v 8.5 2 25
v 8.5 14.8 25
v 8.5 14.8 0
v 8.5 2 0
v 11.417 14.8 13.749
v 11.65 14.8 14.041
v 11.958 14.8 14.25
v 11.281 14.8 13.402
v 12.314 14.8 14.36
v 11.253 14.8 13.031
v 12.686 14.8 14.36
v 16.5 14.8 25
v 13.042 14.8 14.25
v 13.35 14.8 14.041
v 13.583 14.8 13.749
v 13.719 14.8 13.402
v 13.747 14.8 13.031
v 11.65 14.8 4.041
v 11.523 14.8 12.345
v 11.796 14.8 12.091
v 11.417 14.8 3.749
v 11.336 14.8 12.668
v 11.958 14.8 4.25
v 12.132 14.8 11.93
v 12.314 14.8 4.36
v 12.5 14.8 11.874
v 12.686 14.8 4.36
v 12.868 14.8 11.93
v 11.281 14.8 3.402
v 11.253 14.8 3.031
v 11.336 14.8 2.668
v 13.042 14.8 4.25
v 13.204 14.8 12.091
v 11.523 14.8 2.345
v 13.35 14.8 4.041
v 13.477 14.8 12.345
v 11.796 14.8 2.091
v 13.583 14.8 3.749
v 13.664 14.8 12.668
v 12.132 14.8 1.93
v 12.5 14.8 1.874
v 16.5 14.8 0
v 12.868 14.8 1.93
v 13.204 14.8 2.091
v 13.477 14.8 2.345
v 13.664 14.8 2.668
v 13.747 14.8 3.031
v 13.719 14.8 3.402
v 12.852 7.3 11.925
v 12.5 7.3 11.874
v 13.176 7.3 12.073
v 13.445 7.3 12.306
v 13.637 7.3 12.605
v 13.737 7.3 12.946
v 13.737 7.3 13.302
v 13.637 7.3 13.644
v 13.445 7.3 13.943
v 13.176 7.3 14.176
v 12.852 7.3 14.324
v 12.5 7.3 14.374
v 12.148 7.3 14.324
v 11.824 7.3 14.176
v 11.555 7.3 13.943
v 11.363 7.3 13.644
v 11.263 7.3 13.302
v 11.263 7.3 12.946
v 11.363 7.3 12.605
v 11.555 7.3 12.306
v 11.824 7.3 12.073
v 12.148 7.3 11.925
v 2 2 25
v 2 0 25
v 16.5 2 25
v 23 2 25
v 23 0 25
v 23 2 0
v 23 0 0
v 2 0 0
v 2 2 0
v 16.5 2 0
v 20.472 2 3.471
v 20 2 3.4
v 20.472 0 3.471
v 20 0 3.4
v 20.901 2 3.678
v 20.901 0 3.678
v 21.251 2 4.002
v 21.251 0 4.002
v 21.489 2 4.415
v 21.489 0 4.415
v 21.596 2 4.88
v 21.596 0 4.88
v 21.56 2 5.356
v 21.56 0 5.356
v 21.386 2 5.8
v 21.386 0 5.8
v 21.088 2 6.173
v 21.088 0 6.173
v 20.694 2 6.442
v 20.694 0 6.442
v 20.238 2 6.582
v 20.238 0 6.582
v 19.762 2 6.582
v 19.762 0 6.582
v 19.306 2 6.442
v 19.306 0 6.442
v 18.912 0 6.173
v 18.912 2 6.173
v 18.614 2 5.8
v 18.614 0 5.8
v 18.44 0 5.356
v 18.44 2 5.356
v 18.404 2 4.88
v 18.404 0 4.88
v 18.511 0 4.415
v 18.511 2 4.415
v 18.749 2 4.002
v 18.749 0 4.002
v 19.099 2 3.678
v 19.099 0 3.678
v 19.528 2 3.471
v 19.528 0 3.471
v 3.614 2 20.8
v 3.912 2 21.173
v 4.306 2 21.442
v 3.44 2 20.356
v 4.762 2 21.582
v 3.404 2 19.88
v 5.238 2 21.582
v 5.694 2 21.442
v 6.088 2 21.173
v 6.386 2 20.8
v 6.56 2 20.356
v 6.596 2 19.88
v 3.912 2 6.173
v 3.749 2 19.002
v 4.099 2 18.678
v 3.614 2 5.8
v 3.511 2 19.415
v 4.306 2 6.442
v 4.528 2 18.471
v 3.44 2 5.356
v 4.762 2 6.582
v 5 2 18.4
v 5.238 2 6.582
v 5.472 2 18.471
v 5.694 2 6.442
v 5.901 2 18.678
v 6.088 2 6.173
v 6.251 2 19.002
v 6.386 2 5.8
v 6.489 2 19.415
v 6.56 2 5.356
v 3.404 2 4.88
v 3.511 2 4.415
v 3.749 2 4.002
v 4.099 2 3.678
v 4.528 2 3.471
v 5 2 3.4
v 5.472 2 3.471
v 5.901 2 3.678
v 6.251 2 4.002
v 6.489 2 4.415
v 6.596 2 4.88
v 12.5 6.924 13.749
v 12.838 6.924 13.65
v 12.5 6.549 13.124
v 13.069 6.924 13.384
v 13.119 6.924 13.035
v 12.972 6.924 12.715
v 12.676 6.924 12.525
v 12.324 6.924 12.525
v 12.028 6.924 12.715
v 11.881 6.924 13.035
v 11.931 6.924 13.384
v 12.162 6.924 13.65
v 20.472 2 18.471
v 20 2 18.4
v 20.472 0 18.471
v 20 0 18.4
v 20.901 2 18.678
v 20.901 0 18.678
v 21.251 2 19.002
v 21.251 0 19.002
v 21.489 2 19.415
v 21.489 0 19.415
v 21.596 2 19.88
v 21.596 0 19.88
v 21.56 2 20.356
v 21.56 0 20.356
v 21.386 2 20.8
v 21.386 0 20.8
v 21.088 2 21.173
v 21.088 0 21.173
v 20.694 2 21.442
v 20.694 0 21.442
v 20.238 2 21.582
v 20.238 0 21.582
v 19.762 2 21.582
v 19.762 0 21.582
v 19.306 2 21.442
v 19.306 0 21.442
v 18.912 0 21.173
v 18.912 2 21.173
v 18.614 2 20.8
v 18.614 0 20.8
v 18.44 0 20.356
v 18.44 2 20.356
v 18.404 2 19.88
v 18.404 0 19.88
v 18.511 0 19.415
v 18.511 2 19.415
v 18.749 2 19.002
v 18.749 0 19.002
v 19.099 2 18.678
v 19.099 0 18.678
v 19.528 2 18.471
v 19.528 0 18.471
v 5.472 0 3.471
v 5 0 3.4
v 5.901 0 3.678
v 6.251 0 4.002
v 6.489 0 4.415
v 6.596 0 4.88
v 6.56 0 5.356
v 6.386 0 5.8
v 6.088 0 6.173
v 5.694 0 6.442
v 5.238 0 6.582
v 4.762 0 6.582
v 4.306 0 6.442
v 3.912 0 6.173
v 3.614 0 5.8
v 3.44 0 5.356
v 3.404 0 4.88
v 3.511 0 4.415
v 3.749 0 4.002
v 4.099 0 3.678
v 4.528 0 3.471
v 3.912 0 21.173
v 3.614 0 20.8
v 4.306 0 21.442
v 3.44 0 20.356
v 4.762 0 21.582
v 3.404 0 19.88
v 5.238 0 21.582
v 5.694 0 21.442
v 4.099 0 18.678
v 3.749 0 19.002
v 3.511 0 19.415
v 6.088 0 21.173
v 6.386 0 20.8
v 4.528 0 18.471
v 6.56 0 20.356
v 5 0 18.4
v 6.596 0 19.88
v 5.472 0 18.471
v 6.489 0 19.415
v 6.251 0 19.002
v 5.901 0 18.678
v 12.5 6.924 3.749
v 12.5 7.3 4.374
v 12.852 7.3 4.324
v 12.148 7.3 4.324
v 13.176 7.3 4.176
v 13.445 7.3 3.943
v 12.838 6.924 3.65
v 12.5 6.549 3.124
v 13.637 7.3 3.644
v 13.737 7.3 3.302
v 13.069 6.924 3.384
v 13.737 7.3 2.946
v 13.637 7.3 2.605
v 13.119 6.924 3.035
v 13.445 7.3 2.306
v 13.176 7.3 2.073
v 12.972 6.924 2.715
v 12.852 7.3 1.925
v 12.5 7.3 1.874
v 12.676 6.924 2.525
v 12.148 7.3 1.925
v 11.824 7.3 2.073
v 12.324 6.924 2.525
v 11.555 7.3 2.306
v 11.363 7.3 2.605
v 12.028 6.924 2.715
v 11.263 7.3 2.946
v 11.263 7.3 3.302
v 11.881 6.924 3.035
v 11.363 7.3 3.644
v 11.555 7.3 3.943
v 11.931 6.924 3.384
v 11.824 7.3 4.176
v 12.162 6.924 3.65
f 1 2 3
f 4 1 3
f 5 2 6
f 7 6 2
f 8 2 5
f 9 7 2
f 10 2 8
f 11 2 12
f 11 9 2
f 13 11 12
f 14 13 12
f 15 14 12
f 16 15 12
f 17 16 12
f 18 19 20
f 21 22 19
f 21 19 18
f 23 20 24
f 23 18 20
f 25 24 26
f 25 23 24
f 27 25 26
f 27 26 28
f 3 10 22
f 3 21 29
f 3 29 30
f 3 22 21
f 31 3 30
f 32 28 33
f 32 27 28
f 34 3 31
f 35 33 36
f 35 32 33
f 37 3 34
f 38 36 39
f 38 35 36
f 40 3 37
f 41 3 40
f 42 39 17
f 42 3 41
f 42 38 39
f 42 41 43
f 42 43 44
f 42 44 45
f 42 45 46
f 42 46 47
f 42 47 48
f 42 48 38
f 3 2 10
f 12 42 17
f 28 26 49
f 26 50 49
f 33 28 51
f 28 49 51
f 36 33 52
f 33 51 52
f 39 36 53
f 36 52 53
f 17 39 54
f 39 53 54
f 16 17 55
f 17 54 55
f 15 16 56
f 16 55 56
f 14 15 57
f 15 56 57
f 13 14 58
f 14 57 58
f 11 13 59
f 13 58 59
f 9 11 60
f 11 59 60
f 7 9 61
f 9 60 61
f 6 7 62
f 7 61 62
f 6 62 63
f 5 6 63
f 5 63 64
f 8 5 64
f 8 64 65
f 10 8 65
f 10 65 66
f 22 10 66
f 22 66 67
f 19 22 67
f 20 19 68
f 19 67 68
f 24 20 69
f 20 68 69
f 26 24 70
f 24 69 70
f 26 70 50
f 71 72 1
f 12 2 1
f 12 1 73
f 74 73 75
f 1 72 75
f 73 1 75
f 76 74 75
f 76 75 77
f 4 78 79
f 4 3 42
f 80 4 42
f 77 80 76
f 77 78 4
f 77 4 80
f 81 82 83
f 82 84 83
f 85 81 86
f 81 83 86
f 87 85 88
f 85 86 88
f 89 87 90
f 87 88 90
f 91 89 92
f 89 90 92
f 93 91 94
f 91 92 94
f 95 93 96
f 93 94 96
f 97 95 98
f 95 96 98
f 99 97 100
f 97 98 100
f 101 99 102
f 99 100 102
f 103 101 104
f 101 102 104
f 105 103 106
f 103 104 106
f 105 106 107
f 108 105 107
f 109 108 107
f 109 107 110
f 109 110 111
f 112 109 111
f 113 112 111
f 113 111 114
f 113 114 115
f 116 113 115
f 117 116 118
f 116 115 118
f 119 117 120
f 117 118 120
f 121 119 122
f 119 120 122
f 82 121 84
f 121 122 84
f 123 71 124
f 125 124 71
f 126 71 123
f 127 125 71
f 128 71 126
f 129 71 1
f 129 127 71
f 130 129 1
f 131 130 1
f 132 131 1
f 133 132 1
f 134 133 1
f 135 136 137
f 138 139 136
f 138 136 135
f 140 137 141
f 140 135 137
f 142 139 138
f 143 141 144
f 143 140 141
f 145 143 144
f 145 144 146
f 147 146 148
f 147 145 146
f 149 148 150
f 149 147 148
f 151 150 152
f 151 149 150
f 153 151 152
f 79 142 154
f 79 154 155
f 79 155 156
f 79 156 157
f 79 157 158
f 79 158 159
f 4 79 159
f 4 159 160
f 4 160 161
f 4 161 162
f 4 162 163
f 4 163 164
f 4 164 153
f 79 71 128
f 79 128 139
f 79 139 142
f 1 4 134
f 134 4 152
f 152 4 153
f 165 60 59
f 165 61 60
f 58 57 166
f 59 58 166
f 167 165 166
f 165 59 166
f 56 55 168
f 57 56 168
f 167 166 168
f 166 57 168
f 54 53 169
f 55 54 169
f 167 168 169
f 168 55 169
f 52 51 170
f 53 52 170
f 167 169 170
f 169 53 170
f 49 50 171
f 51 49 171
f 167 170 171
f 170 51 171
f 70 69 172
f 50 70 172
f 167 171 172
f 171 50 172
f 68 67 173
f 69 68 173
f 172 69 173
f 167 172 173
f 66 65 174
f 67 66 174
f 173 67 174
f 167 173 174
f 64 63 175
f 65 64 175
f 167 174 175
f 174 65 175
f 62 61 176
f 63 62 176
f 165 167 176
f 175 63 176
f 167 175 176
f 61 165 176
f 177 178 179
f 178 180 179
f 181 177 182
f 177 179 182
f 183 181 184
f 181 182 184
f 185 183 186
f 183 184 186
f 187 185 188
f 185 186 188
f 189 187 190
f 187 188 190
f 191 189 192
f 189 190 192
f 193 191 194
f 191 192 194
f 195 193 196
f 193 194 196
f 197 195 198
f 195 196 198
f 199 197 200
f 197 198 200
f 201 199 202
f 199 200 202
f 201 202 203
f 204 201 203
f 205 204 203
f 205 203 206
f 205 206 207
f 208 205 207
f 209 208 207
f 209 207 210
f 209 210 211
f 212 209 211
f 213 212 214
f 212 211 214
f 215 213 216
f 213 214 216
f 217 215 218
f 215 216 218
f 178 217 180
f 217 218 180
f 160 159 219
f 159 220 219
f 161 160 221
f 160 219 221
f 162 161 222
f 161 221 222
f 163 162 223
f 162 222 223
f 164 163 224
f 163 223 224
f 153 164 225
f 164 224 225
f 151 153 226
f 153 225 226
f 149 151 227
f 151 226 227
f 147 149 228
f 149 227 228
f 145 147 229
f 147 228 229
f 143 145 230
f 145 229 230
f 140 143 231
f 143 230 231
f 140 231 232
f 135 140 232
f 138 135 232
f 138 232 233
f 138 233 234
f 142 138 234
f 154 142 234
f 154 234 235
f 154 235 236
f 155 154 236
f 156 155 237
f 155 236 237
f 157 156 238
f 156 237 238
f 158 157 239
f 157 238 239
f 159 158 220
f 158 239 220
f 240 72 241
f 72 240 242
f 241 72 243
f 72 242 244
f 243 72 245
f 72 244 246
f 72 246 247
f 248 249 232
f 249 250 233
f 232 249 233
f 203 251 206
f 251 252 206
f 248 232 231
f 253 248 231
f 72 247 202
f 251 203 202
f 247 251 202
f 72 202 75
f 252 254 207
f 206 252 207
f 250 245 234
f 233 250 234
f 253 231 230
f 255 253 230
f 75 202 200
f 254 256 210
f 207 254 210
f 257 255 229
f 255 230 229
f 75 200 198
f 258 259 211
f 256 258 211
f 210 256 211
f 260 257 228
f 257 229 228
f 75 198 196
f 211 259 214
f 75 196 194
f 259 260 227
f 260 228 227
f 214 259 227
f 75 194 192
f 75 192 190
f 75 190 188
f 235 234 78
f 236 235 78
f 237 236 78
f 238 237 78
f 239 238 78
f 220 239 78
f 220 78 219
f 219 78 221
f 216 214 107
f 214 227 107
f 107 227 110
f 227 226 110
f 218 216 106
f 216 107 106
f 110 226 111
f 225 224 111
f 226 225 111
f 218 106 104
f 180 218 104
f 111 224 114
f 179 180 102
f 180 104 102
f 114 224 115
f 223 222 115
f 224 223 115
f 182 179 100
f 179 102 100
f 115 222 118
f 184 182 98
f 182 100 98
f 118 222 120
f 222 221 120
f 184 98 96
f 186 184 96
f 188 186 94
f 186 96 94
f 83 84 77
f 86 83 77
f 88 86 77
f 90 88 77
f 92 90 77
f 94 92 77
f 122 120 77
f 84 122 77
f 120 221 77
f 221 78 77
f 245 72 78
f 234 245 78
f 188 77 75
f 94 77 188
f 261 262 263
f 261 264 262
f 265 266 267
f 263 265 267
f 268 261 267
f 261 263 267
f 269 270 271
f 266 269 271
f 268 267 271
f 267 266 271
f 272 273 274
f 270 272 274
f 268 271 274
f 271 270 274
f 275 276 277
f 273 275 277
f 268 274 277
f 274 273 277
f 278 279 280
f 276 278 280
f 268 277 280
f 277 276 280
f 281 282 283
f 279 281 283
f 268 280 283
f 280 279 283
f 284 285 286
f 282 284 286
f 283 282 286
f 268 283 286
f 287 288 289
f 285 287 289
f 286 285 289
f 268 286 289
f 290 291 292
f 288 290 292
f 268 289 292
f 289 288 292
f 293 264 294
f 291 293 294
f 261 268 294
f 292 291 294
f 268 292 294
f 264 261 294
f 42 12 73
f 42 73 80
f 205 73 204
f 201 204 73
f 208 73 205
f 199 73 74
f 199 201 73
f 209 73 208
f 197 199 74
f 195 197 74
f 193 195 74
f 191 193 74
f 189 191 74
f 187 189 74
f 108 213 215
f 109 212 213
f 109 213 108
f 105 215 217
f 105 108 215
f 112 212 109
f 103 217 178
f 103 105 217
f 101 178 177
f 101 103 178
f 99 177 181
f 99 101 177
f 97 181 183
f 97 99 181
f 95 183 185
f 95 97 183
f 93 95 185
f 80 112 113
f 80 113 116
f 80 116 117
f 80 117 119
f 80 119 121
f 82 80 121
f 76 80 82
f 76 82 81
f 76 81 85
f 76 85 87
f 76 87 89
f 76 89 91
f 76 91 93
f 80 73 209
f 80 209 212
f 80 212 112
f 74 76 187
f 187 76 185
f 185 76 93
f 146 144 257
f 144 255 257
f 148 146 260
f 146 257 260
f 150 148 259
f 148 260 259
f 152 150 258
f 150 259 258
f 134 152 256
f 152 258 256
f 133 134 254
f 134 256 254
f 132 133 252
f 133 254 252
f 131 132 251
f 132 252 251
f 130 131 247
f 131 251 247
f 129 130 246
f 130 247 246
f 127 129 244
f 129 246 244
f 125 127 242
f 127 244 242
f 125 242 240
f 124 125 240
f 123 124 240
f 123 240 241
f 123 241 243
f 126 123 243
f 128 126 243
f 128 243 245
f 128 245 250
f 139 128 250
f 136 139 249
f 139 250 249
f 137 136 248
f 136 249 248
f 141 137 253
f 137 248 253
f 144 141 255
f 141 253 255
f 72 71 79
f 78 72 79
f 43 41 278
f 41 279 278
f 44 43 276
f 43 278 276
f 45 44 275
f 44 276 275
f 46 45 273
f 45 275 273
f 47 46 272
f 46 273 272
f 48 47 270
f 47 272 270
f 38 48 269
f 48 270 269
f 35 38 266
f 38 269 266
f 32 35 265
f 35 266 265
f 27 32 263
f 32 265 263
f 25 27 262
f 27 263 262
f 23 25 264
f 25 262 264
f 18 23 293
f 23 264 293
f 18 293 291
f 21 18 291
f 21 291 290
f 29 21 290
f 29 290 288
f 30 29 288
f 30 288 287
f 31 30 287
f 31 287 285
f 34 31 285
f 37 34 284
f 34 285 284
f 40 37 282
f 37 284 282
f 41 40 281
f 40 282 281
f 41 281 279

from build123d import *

# Parameters (mm, degrees)
SKETCH1_W                 = 25
SKETCH1_H                 = 25
BOSS_EXTRUDE1_DEPTH       = 14.8
M3_CLEARANCE_HOLE1_D      = 3.2
M3X0_5_TAPPED_HOLE2_D     = 2.5
M3X0_5_TAPPED_HOLE2_DEPTH = 7.5
M3X0_5_TAPPED_HOLE2_TIP   = 0.751075774
SKETCH8_W                 = 8.5
SKETCH8_H                 = 25
CUT_EXTRUDE1_DEPTH        = 9.77
SKETCH9_W                 = 8.5
SKETCH9_H                 = 25
CUT_EXTRUDE2_DEPTH        = 9.77
SKETCH10_W                = 2
SKETCH10_H                = 25
CUT_EXTRUDE3_DEPTH        = 9.77
SKETCH11_W                = 2
SKETCH11_H                = 25
CUT_EXTRUDE4_DEPTH        = 9.77
SKETCH16_W                = 6.5
SKETCH16_H                = 25
CUT_EXTRUDE6_DEPTH        = 3.03
SKETCH17_W                = 6.5
SKETCH17_H                = 25
CUT_EXTRUDE7_DEPTH        = 3.03


with BuildPart() as part:
    # Sketch1 → Boss-Extrude1 (new body)
    with BuildSketch(Plane(origin=(0, 0, 0), x_dir=(1, 0, 0), z_dir=(0, 1, 0))):
        with Locations((12.5, -12.5)):
            Rectangle(SKETCH1_W, SKETCH1_H)
    extrude(amount=BOSS_EXTRUDE1_DEPTH)

    # M3 Clearance Hole1 (through all)
    with Locations(Plane(origin=(5, 14.8, 5), x_dir=(0, 0, 1), z_dir=(0, 1, 0))):
        with Locations((0, 0), (0, 15), (15, 15), (15, 0)):
            Hole(M3_CLEARANCE_HOLE1_D / 2)

    # M3x0.5 Tapped Hole2
    with Locations(Plane(origin=(12.5, 14.8, 3.124233191), x_dir=(0, 0, 1), z_dir=(0, 1, 0))):
        with Locations((0, 0), (10, 0)):
            Hole(M3X0_5_TAPPED_HOLE2_D / 2, depth=M3X0_5_TAPPED_HOLE2_DEPTH)
            with Locations((0, 0, -(M3X0_5_TAPPED_HOLE2_DEPTH + M3X0_5_TAPPED_HOLE2_TIP / 2))):  # 118° drill point
                Cone(0, M3X0_5_TAPPED_HOLE2_D / 2, M3X0_5_TAPPED_HOLE2_TIP, mode=Mode.SUBTRACT)

    # Sketch8 → Cut-Extrude1 (cut)
    with BuildSketch(Plane(origin=(0, 14.8, 0), x_dir=(1, 0, 0), z_dir=(0, 1, 0))):
        with Locations((4.25, -12.5)):
            Rectangle(SKETCH8_W, SKETCH8_H)
    extrude(amount=-CUT_EXTRUDE1_DEPTH, mode=Mode.SUBTRACT)

    # Sketch9 → Cut-Extrude2 (cut)
    with BuildSketch(Plane(origin=(0, 14.8, 0), x_dir=(1, 0, 0), z_dir=(0, 1, 0))):
        with Locations((20.75, -12.5)):
            Rectangle(SKETCH9_W, SKETCH9_H)
    extrude(amount=-CUT_EXTRUDE2_DEPTH, mode=Mode.SUBTRACT)

    # Sketch10 → Cut-Extrude3 (cut)
    with BuildSketch(Plane(origin=(0, 5.03, 0), x_dir=(1, 0, 0), z_dir=(0, 1, 0))):
        with Locations((1, -12.5)):
            Rectangle(SKETCH10_W, SKETCH10_H)
    extrude(amount=-CUT_EXTRUDE3_DEPTH, mode=Mode.SUBTRACT)

    # Sketch11 → Cut-Extrude4 (cut)
    with BuildSketch(Plane(origin=(0, 5.03, 0), x_dir=(1, 0, 0), z_dir=(0, 1, 0))):
        with Locations((24, -12.5)):
            Rectangle(SKETCH11_W, SKETCH11_H)
    extrude(amount=-CUT_EXTRUDE4_DEPTH, mode=Mode.SUBTRACT)

    # Sketch16 → Cut-Extrude6 (cut)
    with BuildSketch(Plane(origin=(0, 5.03, 0), x_dir=(1, 0, 0), z_dir=(0, 1, 0))):
        with Locations((5.25, -12.5)):
            Rectangle(SKETCH16_W, SKETCH16_H)
    extrude(amount=-CUT_EXTRUDE6_DEPTH, mode=Mode.SUBTRACT)

    # Sketch17 → Cut-Extrude7 (cut)
    with BuildSketch(Plane(origin=(0, 5.03, 0), x_dir=(1, 0, 0), z_dir=(0, 1, 0))):
        with Locations((19.75, -12.5)):
            Rectangle(SKETCH17_W, SKETCH17_H)
    extrude(amount=-CUT_EXTRUDE7_DEPTH, mode=Mode.SUBTRACT)


solid = part.part
